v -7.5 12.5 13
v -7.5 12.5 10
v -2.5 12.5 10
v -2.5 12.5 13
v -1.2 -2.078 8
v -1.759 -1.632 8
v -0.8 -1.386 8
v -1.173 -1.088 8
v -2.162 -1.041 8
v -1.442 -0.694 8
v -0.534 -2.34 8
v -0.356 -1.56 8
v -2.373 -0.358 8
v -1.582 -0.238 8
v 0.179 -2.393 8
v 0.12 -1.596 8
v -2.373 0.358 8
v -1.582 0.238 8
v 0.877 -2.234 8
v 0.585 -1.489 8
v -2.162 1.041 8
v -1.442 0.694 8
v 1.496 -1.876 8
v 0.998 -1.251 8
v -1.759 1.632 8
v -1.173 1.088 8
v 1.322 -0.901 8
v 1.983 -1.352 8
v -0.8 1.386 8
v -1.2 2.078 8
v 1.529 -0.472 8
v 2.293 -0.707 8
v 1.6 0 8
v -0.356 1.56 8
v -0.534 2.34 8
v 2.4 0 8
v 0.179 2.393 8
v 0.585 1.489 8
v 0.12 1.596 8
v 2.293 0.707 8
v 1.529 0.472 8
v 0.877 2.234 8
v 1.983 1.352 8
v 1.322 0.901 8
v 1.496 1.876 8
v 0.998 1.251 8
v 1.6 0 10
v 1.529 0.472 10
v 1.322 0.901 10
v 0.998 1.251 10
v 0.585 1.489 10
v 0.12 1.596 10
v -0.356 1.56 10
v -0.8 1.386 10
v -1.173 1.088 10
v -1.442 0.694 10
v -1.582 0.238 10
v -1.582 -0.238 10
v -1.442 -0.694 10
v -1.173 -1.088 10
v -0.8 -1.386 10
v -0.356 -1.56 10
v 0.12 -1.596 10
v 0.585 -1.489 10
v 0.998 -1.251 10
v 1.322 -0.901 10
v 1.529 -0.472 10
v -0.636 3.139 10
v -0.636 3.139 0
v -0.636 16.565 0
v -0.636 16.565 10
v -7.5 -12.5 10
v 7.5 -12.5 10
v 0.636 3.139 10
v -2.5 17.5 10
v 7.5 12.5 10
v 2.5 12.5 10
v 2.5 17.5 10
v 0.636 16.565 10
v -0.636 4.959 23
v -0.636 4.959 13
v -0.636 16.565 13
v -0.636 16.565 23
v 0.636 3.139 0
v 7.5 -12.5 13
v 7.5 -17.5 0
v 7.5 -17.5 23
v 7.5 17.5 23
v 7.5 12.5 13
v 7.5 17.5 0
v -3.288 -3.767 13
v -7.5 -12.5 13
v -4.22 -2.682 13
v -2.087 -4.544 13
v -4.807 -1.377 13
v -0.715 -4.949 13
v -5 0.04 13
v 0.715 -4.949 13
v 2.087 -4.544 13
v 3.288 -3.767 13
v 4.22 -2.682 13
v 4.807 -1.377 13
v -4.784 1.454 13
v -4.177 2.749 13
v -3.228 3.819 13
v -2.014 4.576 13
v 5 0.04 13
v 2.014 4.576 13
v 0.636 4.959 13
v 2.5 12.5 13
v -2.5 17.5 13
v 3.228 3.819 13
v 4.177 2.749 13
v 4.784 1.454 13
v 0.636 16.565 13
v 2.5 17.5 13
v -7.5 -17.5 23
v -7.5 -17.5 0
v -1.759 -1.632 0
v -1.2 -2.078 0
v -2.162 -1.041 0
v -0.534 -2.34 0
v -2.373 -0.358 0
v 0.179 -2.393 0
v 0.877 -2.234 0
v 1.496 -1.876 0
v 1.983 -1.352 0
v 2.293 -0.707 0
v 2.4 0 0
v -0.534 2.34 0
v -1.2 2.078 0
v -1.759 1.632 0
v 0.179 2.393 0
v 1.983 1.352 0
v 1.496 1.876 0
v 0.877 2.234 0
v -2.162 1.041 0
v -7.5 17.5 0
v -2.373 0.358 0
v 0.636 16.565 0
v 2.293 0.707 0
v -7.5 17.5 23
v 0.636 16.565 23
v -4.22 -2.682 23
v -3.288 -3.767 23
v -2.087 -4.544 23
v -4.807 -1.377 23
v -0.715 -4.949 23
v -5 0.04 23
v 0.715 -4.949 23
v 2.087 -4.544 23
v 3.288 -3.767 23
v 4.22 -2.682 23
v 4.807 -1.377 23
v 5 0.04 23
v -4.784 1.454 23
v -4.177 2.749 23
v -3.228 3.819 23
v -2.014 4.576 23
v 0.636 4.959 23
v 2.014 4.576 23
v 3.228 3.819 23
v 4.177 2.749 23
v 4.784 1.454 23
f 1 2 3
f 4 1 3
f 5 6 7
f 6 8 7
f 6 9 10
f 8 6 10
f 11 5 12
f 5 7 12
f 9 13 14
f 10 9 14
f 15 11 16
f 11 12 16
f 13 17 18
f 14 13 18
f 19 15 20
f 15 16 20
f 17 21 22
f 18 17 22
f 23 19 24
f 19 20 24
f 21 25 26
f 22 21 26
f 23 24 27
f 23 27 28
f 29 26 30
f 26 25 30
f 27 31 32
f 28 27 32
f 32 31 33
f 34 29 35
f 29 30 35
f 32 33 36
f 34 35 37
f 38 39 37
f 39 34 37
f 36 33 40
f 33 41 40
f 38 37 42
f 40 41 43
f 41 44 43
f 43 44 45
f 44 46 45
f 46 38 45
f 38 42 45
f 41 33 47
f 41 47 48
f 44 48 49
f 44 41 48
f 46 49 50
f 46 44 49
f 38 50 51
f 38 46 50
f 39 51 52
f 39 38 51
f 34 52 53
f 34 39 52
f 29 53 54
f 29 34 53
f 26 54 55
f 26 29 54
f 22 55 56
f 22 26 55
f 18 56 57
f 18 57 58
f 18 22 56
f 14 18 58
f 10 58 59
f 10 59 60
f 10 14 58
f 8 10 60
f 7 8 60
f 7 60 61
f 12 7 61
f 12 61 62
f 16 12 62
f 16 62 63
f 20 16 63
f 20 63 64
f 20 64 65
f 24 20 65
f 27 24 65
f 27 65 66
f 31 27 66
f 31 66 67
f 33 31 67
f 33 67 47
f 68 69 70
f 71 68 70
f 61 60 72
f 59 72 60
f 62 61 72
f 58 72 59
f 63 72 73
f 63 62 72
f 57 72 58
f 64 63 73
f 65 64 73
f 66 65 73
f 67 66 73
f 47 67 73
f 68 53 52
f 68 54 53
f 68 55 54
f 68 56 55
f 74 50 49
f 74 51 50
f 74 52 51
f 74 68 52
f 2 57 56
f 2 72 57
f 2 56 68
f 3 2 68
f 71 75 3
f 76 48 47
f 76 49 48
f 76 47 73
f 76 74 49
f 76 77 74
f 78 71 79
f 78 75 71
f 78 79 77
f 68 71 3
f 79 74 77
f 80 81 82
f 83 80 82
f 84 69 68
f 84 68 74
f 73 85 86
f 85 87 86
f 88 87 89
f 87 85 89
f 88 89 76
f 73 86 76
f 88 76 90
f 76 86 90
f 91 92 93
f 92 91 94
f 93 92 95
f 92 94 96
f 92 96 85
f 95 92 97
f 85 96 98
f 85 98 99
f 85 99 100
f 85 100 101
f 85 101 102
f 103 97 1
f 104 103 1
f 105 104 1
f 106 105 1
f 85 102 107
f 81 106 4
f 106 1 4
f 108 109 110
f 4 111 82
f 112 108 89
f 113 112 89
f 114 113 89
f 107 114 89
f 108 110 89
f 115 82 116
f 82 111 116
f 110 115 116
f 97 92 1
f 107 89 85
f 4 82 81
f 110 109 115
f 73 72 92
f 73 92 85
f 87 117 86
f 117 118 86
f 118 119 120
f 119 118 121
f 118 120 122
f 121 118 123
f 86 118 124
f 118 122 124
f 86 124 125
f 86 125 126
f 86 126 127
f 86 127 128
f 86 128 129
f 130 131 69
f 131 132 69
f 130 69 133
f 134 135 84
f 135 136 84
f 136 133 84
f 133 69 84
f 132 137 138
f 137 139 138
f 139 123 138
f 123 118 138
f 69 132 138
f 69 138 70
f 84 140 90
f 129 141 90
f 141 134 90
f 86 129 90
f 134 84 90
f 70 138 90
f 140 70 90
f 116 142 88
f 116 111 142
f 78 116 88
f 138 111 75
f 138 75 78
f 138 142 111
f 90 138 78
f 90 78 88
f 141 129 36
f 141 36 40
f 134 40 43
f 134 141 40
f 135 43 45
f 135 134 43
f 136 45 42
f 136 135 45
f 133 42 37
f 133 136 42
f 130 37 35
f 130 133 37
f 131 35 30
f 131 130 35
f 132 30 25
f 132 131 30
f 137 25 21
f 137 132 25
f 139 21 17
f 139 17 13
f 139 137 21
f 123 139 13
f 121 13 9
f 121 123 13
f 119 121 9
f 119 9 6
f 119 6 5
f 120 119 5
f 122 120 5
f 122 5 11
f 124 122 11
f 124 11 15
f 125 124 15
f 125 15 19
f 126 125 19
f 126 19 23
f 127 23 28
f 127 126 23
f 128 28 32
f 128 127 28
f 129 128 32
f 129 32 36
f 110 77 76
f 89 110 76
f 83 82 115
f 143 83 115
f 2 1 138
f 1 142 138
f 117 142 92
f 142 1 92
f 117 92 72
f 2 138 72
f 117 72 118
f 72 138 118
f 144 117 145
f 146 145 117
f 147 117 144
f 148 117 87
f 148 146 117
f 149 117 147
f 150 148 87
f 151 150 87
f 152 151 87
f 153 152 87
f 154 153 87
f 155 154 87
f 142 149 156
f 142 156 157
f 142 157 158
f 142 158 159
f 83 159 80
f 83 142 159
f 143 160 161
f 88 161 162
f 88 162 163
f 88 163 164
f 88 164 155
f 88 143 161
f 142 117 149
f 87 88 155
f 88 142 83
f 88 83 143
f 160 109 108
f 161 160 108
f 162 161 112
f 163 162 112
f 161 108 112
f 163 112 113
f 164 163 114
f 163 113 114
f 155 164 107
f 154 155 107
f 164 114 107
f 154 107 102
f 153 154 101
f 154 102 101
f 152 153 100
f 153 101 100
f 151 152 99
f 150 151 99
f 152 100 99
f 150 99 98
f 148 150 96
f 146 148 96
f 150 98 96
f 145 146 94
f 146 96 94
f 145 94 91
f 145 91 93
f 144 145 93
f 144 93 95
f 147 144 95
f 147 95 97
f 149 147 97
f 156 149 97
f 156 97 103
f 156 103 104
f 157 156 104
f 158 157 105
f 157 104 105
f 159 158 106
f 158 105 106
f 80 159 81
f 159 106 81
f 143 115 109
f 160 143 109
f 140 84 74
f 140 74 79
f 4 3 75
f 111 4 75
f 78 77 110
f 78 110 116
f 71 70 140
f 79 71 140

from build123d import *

# Parameters (mm, degrees)
SKETCH1_W           = 15
SKETCH1_H           = 35
SKETCH1_W_2         = 1.272906456
SKETCH1_H_2         = 13.426112712
SKETCH1_R           = 1.6
BOSS_EXTRUDE4_DEPTH = 10
SKETCH1_9_R         = 2.4
SKETCH1_9_R_2       = 1.6
CUT_EXTRUDE3_DEPTH  = 8
SKETCH1_10_W        = 15
SKETCH1_10_H        = 5
SKETCH1_10_W_2      = 5
BOSS_EXTRUDE5_DEPTH = 13
BOSS_EXTRUDE6_START = 13
SKETCH1_11_W        = 15
SKETCH1_11_H        = 35
BOSS_EXTRUDE6_DEPTH = 10


with BuildPart() as part:
    # Sketch1 → Boss-Extrude4 (new body)
    with BuildSketch(Plane.XY):
        Rectangle(SKETCH1_W, SKETCH1_H)
        with Locations((0, 9.851749103)):
            Rectangle(SKETCH1_W_2, SKETCH1_H_2, mode=Mode.SUBTRACT)
        Circle(SKETCH1_R, mode=Mode.SUBTRACT)
    extrude(amount=BOSS_EXTRUDE4_DEPTH)

    # Sketch1<9> → Cut-Extrude3 (cut)
    with BuildSketch(Plane.XY):
        Circle(SKETCH1_9_R)
        Circle(SKETCH1_9_R_2, mode=Mode.SUBTRACT)
    extrude(amount=CUT_EXTRUDE3_DEPTH, mode=Mode.SUBTRACT)

    # Sketch1<10> → Boss-Extrude5 (add)
    with BuildSketch(Plane.XY):
        with Locations((0, -15)):
            Rectangle(SKETCH1_10_W, SKETCH1_10_H)
        with Locations((-5, 15)):
            Rectangle(SKETCH1_10_W_2, SKETCH1_10_H)
        with Locations((5, 15)):
            Rectangle(SKETCH1_10_W_2, SKETCH1_10_H)
    extrude(amount=BOSS_EXTRUDE5_DEPTH)

    # Sketch1<11> → Boss-Extrude6 (add)
    with BuildSketch(Plane.XY.offset(BOSS_EXTRUDE6_START)):
        Rectangle(SKETCH1_11_W, SKETCH1_11_H)
        with BuildLine():
            Line((-0.636453228, 16.564805459), (0.636453228, 16.564805459))
            Line((0.636453228, 16.564805459), (0.636453228, 4.959327302))
            ThreePointArc((0.636453228, 4.959327302), (0, -5), (-0.636453228, 4.959327302))
            Line((-0.636453228, 4.959327302), (-0.636453228, 16.564805459))
        make_face(mode=Mode.SUBTRACT)
    extrude(amount=BOSS_EXTRUDE6_DEPTH)


solid = part.part
